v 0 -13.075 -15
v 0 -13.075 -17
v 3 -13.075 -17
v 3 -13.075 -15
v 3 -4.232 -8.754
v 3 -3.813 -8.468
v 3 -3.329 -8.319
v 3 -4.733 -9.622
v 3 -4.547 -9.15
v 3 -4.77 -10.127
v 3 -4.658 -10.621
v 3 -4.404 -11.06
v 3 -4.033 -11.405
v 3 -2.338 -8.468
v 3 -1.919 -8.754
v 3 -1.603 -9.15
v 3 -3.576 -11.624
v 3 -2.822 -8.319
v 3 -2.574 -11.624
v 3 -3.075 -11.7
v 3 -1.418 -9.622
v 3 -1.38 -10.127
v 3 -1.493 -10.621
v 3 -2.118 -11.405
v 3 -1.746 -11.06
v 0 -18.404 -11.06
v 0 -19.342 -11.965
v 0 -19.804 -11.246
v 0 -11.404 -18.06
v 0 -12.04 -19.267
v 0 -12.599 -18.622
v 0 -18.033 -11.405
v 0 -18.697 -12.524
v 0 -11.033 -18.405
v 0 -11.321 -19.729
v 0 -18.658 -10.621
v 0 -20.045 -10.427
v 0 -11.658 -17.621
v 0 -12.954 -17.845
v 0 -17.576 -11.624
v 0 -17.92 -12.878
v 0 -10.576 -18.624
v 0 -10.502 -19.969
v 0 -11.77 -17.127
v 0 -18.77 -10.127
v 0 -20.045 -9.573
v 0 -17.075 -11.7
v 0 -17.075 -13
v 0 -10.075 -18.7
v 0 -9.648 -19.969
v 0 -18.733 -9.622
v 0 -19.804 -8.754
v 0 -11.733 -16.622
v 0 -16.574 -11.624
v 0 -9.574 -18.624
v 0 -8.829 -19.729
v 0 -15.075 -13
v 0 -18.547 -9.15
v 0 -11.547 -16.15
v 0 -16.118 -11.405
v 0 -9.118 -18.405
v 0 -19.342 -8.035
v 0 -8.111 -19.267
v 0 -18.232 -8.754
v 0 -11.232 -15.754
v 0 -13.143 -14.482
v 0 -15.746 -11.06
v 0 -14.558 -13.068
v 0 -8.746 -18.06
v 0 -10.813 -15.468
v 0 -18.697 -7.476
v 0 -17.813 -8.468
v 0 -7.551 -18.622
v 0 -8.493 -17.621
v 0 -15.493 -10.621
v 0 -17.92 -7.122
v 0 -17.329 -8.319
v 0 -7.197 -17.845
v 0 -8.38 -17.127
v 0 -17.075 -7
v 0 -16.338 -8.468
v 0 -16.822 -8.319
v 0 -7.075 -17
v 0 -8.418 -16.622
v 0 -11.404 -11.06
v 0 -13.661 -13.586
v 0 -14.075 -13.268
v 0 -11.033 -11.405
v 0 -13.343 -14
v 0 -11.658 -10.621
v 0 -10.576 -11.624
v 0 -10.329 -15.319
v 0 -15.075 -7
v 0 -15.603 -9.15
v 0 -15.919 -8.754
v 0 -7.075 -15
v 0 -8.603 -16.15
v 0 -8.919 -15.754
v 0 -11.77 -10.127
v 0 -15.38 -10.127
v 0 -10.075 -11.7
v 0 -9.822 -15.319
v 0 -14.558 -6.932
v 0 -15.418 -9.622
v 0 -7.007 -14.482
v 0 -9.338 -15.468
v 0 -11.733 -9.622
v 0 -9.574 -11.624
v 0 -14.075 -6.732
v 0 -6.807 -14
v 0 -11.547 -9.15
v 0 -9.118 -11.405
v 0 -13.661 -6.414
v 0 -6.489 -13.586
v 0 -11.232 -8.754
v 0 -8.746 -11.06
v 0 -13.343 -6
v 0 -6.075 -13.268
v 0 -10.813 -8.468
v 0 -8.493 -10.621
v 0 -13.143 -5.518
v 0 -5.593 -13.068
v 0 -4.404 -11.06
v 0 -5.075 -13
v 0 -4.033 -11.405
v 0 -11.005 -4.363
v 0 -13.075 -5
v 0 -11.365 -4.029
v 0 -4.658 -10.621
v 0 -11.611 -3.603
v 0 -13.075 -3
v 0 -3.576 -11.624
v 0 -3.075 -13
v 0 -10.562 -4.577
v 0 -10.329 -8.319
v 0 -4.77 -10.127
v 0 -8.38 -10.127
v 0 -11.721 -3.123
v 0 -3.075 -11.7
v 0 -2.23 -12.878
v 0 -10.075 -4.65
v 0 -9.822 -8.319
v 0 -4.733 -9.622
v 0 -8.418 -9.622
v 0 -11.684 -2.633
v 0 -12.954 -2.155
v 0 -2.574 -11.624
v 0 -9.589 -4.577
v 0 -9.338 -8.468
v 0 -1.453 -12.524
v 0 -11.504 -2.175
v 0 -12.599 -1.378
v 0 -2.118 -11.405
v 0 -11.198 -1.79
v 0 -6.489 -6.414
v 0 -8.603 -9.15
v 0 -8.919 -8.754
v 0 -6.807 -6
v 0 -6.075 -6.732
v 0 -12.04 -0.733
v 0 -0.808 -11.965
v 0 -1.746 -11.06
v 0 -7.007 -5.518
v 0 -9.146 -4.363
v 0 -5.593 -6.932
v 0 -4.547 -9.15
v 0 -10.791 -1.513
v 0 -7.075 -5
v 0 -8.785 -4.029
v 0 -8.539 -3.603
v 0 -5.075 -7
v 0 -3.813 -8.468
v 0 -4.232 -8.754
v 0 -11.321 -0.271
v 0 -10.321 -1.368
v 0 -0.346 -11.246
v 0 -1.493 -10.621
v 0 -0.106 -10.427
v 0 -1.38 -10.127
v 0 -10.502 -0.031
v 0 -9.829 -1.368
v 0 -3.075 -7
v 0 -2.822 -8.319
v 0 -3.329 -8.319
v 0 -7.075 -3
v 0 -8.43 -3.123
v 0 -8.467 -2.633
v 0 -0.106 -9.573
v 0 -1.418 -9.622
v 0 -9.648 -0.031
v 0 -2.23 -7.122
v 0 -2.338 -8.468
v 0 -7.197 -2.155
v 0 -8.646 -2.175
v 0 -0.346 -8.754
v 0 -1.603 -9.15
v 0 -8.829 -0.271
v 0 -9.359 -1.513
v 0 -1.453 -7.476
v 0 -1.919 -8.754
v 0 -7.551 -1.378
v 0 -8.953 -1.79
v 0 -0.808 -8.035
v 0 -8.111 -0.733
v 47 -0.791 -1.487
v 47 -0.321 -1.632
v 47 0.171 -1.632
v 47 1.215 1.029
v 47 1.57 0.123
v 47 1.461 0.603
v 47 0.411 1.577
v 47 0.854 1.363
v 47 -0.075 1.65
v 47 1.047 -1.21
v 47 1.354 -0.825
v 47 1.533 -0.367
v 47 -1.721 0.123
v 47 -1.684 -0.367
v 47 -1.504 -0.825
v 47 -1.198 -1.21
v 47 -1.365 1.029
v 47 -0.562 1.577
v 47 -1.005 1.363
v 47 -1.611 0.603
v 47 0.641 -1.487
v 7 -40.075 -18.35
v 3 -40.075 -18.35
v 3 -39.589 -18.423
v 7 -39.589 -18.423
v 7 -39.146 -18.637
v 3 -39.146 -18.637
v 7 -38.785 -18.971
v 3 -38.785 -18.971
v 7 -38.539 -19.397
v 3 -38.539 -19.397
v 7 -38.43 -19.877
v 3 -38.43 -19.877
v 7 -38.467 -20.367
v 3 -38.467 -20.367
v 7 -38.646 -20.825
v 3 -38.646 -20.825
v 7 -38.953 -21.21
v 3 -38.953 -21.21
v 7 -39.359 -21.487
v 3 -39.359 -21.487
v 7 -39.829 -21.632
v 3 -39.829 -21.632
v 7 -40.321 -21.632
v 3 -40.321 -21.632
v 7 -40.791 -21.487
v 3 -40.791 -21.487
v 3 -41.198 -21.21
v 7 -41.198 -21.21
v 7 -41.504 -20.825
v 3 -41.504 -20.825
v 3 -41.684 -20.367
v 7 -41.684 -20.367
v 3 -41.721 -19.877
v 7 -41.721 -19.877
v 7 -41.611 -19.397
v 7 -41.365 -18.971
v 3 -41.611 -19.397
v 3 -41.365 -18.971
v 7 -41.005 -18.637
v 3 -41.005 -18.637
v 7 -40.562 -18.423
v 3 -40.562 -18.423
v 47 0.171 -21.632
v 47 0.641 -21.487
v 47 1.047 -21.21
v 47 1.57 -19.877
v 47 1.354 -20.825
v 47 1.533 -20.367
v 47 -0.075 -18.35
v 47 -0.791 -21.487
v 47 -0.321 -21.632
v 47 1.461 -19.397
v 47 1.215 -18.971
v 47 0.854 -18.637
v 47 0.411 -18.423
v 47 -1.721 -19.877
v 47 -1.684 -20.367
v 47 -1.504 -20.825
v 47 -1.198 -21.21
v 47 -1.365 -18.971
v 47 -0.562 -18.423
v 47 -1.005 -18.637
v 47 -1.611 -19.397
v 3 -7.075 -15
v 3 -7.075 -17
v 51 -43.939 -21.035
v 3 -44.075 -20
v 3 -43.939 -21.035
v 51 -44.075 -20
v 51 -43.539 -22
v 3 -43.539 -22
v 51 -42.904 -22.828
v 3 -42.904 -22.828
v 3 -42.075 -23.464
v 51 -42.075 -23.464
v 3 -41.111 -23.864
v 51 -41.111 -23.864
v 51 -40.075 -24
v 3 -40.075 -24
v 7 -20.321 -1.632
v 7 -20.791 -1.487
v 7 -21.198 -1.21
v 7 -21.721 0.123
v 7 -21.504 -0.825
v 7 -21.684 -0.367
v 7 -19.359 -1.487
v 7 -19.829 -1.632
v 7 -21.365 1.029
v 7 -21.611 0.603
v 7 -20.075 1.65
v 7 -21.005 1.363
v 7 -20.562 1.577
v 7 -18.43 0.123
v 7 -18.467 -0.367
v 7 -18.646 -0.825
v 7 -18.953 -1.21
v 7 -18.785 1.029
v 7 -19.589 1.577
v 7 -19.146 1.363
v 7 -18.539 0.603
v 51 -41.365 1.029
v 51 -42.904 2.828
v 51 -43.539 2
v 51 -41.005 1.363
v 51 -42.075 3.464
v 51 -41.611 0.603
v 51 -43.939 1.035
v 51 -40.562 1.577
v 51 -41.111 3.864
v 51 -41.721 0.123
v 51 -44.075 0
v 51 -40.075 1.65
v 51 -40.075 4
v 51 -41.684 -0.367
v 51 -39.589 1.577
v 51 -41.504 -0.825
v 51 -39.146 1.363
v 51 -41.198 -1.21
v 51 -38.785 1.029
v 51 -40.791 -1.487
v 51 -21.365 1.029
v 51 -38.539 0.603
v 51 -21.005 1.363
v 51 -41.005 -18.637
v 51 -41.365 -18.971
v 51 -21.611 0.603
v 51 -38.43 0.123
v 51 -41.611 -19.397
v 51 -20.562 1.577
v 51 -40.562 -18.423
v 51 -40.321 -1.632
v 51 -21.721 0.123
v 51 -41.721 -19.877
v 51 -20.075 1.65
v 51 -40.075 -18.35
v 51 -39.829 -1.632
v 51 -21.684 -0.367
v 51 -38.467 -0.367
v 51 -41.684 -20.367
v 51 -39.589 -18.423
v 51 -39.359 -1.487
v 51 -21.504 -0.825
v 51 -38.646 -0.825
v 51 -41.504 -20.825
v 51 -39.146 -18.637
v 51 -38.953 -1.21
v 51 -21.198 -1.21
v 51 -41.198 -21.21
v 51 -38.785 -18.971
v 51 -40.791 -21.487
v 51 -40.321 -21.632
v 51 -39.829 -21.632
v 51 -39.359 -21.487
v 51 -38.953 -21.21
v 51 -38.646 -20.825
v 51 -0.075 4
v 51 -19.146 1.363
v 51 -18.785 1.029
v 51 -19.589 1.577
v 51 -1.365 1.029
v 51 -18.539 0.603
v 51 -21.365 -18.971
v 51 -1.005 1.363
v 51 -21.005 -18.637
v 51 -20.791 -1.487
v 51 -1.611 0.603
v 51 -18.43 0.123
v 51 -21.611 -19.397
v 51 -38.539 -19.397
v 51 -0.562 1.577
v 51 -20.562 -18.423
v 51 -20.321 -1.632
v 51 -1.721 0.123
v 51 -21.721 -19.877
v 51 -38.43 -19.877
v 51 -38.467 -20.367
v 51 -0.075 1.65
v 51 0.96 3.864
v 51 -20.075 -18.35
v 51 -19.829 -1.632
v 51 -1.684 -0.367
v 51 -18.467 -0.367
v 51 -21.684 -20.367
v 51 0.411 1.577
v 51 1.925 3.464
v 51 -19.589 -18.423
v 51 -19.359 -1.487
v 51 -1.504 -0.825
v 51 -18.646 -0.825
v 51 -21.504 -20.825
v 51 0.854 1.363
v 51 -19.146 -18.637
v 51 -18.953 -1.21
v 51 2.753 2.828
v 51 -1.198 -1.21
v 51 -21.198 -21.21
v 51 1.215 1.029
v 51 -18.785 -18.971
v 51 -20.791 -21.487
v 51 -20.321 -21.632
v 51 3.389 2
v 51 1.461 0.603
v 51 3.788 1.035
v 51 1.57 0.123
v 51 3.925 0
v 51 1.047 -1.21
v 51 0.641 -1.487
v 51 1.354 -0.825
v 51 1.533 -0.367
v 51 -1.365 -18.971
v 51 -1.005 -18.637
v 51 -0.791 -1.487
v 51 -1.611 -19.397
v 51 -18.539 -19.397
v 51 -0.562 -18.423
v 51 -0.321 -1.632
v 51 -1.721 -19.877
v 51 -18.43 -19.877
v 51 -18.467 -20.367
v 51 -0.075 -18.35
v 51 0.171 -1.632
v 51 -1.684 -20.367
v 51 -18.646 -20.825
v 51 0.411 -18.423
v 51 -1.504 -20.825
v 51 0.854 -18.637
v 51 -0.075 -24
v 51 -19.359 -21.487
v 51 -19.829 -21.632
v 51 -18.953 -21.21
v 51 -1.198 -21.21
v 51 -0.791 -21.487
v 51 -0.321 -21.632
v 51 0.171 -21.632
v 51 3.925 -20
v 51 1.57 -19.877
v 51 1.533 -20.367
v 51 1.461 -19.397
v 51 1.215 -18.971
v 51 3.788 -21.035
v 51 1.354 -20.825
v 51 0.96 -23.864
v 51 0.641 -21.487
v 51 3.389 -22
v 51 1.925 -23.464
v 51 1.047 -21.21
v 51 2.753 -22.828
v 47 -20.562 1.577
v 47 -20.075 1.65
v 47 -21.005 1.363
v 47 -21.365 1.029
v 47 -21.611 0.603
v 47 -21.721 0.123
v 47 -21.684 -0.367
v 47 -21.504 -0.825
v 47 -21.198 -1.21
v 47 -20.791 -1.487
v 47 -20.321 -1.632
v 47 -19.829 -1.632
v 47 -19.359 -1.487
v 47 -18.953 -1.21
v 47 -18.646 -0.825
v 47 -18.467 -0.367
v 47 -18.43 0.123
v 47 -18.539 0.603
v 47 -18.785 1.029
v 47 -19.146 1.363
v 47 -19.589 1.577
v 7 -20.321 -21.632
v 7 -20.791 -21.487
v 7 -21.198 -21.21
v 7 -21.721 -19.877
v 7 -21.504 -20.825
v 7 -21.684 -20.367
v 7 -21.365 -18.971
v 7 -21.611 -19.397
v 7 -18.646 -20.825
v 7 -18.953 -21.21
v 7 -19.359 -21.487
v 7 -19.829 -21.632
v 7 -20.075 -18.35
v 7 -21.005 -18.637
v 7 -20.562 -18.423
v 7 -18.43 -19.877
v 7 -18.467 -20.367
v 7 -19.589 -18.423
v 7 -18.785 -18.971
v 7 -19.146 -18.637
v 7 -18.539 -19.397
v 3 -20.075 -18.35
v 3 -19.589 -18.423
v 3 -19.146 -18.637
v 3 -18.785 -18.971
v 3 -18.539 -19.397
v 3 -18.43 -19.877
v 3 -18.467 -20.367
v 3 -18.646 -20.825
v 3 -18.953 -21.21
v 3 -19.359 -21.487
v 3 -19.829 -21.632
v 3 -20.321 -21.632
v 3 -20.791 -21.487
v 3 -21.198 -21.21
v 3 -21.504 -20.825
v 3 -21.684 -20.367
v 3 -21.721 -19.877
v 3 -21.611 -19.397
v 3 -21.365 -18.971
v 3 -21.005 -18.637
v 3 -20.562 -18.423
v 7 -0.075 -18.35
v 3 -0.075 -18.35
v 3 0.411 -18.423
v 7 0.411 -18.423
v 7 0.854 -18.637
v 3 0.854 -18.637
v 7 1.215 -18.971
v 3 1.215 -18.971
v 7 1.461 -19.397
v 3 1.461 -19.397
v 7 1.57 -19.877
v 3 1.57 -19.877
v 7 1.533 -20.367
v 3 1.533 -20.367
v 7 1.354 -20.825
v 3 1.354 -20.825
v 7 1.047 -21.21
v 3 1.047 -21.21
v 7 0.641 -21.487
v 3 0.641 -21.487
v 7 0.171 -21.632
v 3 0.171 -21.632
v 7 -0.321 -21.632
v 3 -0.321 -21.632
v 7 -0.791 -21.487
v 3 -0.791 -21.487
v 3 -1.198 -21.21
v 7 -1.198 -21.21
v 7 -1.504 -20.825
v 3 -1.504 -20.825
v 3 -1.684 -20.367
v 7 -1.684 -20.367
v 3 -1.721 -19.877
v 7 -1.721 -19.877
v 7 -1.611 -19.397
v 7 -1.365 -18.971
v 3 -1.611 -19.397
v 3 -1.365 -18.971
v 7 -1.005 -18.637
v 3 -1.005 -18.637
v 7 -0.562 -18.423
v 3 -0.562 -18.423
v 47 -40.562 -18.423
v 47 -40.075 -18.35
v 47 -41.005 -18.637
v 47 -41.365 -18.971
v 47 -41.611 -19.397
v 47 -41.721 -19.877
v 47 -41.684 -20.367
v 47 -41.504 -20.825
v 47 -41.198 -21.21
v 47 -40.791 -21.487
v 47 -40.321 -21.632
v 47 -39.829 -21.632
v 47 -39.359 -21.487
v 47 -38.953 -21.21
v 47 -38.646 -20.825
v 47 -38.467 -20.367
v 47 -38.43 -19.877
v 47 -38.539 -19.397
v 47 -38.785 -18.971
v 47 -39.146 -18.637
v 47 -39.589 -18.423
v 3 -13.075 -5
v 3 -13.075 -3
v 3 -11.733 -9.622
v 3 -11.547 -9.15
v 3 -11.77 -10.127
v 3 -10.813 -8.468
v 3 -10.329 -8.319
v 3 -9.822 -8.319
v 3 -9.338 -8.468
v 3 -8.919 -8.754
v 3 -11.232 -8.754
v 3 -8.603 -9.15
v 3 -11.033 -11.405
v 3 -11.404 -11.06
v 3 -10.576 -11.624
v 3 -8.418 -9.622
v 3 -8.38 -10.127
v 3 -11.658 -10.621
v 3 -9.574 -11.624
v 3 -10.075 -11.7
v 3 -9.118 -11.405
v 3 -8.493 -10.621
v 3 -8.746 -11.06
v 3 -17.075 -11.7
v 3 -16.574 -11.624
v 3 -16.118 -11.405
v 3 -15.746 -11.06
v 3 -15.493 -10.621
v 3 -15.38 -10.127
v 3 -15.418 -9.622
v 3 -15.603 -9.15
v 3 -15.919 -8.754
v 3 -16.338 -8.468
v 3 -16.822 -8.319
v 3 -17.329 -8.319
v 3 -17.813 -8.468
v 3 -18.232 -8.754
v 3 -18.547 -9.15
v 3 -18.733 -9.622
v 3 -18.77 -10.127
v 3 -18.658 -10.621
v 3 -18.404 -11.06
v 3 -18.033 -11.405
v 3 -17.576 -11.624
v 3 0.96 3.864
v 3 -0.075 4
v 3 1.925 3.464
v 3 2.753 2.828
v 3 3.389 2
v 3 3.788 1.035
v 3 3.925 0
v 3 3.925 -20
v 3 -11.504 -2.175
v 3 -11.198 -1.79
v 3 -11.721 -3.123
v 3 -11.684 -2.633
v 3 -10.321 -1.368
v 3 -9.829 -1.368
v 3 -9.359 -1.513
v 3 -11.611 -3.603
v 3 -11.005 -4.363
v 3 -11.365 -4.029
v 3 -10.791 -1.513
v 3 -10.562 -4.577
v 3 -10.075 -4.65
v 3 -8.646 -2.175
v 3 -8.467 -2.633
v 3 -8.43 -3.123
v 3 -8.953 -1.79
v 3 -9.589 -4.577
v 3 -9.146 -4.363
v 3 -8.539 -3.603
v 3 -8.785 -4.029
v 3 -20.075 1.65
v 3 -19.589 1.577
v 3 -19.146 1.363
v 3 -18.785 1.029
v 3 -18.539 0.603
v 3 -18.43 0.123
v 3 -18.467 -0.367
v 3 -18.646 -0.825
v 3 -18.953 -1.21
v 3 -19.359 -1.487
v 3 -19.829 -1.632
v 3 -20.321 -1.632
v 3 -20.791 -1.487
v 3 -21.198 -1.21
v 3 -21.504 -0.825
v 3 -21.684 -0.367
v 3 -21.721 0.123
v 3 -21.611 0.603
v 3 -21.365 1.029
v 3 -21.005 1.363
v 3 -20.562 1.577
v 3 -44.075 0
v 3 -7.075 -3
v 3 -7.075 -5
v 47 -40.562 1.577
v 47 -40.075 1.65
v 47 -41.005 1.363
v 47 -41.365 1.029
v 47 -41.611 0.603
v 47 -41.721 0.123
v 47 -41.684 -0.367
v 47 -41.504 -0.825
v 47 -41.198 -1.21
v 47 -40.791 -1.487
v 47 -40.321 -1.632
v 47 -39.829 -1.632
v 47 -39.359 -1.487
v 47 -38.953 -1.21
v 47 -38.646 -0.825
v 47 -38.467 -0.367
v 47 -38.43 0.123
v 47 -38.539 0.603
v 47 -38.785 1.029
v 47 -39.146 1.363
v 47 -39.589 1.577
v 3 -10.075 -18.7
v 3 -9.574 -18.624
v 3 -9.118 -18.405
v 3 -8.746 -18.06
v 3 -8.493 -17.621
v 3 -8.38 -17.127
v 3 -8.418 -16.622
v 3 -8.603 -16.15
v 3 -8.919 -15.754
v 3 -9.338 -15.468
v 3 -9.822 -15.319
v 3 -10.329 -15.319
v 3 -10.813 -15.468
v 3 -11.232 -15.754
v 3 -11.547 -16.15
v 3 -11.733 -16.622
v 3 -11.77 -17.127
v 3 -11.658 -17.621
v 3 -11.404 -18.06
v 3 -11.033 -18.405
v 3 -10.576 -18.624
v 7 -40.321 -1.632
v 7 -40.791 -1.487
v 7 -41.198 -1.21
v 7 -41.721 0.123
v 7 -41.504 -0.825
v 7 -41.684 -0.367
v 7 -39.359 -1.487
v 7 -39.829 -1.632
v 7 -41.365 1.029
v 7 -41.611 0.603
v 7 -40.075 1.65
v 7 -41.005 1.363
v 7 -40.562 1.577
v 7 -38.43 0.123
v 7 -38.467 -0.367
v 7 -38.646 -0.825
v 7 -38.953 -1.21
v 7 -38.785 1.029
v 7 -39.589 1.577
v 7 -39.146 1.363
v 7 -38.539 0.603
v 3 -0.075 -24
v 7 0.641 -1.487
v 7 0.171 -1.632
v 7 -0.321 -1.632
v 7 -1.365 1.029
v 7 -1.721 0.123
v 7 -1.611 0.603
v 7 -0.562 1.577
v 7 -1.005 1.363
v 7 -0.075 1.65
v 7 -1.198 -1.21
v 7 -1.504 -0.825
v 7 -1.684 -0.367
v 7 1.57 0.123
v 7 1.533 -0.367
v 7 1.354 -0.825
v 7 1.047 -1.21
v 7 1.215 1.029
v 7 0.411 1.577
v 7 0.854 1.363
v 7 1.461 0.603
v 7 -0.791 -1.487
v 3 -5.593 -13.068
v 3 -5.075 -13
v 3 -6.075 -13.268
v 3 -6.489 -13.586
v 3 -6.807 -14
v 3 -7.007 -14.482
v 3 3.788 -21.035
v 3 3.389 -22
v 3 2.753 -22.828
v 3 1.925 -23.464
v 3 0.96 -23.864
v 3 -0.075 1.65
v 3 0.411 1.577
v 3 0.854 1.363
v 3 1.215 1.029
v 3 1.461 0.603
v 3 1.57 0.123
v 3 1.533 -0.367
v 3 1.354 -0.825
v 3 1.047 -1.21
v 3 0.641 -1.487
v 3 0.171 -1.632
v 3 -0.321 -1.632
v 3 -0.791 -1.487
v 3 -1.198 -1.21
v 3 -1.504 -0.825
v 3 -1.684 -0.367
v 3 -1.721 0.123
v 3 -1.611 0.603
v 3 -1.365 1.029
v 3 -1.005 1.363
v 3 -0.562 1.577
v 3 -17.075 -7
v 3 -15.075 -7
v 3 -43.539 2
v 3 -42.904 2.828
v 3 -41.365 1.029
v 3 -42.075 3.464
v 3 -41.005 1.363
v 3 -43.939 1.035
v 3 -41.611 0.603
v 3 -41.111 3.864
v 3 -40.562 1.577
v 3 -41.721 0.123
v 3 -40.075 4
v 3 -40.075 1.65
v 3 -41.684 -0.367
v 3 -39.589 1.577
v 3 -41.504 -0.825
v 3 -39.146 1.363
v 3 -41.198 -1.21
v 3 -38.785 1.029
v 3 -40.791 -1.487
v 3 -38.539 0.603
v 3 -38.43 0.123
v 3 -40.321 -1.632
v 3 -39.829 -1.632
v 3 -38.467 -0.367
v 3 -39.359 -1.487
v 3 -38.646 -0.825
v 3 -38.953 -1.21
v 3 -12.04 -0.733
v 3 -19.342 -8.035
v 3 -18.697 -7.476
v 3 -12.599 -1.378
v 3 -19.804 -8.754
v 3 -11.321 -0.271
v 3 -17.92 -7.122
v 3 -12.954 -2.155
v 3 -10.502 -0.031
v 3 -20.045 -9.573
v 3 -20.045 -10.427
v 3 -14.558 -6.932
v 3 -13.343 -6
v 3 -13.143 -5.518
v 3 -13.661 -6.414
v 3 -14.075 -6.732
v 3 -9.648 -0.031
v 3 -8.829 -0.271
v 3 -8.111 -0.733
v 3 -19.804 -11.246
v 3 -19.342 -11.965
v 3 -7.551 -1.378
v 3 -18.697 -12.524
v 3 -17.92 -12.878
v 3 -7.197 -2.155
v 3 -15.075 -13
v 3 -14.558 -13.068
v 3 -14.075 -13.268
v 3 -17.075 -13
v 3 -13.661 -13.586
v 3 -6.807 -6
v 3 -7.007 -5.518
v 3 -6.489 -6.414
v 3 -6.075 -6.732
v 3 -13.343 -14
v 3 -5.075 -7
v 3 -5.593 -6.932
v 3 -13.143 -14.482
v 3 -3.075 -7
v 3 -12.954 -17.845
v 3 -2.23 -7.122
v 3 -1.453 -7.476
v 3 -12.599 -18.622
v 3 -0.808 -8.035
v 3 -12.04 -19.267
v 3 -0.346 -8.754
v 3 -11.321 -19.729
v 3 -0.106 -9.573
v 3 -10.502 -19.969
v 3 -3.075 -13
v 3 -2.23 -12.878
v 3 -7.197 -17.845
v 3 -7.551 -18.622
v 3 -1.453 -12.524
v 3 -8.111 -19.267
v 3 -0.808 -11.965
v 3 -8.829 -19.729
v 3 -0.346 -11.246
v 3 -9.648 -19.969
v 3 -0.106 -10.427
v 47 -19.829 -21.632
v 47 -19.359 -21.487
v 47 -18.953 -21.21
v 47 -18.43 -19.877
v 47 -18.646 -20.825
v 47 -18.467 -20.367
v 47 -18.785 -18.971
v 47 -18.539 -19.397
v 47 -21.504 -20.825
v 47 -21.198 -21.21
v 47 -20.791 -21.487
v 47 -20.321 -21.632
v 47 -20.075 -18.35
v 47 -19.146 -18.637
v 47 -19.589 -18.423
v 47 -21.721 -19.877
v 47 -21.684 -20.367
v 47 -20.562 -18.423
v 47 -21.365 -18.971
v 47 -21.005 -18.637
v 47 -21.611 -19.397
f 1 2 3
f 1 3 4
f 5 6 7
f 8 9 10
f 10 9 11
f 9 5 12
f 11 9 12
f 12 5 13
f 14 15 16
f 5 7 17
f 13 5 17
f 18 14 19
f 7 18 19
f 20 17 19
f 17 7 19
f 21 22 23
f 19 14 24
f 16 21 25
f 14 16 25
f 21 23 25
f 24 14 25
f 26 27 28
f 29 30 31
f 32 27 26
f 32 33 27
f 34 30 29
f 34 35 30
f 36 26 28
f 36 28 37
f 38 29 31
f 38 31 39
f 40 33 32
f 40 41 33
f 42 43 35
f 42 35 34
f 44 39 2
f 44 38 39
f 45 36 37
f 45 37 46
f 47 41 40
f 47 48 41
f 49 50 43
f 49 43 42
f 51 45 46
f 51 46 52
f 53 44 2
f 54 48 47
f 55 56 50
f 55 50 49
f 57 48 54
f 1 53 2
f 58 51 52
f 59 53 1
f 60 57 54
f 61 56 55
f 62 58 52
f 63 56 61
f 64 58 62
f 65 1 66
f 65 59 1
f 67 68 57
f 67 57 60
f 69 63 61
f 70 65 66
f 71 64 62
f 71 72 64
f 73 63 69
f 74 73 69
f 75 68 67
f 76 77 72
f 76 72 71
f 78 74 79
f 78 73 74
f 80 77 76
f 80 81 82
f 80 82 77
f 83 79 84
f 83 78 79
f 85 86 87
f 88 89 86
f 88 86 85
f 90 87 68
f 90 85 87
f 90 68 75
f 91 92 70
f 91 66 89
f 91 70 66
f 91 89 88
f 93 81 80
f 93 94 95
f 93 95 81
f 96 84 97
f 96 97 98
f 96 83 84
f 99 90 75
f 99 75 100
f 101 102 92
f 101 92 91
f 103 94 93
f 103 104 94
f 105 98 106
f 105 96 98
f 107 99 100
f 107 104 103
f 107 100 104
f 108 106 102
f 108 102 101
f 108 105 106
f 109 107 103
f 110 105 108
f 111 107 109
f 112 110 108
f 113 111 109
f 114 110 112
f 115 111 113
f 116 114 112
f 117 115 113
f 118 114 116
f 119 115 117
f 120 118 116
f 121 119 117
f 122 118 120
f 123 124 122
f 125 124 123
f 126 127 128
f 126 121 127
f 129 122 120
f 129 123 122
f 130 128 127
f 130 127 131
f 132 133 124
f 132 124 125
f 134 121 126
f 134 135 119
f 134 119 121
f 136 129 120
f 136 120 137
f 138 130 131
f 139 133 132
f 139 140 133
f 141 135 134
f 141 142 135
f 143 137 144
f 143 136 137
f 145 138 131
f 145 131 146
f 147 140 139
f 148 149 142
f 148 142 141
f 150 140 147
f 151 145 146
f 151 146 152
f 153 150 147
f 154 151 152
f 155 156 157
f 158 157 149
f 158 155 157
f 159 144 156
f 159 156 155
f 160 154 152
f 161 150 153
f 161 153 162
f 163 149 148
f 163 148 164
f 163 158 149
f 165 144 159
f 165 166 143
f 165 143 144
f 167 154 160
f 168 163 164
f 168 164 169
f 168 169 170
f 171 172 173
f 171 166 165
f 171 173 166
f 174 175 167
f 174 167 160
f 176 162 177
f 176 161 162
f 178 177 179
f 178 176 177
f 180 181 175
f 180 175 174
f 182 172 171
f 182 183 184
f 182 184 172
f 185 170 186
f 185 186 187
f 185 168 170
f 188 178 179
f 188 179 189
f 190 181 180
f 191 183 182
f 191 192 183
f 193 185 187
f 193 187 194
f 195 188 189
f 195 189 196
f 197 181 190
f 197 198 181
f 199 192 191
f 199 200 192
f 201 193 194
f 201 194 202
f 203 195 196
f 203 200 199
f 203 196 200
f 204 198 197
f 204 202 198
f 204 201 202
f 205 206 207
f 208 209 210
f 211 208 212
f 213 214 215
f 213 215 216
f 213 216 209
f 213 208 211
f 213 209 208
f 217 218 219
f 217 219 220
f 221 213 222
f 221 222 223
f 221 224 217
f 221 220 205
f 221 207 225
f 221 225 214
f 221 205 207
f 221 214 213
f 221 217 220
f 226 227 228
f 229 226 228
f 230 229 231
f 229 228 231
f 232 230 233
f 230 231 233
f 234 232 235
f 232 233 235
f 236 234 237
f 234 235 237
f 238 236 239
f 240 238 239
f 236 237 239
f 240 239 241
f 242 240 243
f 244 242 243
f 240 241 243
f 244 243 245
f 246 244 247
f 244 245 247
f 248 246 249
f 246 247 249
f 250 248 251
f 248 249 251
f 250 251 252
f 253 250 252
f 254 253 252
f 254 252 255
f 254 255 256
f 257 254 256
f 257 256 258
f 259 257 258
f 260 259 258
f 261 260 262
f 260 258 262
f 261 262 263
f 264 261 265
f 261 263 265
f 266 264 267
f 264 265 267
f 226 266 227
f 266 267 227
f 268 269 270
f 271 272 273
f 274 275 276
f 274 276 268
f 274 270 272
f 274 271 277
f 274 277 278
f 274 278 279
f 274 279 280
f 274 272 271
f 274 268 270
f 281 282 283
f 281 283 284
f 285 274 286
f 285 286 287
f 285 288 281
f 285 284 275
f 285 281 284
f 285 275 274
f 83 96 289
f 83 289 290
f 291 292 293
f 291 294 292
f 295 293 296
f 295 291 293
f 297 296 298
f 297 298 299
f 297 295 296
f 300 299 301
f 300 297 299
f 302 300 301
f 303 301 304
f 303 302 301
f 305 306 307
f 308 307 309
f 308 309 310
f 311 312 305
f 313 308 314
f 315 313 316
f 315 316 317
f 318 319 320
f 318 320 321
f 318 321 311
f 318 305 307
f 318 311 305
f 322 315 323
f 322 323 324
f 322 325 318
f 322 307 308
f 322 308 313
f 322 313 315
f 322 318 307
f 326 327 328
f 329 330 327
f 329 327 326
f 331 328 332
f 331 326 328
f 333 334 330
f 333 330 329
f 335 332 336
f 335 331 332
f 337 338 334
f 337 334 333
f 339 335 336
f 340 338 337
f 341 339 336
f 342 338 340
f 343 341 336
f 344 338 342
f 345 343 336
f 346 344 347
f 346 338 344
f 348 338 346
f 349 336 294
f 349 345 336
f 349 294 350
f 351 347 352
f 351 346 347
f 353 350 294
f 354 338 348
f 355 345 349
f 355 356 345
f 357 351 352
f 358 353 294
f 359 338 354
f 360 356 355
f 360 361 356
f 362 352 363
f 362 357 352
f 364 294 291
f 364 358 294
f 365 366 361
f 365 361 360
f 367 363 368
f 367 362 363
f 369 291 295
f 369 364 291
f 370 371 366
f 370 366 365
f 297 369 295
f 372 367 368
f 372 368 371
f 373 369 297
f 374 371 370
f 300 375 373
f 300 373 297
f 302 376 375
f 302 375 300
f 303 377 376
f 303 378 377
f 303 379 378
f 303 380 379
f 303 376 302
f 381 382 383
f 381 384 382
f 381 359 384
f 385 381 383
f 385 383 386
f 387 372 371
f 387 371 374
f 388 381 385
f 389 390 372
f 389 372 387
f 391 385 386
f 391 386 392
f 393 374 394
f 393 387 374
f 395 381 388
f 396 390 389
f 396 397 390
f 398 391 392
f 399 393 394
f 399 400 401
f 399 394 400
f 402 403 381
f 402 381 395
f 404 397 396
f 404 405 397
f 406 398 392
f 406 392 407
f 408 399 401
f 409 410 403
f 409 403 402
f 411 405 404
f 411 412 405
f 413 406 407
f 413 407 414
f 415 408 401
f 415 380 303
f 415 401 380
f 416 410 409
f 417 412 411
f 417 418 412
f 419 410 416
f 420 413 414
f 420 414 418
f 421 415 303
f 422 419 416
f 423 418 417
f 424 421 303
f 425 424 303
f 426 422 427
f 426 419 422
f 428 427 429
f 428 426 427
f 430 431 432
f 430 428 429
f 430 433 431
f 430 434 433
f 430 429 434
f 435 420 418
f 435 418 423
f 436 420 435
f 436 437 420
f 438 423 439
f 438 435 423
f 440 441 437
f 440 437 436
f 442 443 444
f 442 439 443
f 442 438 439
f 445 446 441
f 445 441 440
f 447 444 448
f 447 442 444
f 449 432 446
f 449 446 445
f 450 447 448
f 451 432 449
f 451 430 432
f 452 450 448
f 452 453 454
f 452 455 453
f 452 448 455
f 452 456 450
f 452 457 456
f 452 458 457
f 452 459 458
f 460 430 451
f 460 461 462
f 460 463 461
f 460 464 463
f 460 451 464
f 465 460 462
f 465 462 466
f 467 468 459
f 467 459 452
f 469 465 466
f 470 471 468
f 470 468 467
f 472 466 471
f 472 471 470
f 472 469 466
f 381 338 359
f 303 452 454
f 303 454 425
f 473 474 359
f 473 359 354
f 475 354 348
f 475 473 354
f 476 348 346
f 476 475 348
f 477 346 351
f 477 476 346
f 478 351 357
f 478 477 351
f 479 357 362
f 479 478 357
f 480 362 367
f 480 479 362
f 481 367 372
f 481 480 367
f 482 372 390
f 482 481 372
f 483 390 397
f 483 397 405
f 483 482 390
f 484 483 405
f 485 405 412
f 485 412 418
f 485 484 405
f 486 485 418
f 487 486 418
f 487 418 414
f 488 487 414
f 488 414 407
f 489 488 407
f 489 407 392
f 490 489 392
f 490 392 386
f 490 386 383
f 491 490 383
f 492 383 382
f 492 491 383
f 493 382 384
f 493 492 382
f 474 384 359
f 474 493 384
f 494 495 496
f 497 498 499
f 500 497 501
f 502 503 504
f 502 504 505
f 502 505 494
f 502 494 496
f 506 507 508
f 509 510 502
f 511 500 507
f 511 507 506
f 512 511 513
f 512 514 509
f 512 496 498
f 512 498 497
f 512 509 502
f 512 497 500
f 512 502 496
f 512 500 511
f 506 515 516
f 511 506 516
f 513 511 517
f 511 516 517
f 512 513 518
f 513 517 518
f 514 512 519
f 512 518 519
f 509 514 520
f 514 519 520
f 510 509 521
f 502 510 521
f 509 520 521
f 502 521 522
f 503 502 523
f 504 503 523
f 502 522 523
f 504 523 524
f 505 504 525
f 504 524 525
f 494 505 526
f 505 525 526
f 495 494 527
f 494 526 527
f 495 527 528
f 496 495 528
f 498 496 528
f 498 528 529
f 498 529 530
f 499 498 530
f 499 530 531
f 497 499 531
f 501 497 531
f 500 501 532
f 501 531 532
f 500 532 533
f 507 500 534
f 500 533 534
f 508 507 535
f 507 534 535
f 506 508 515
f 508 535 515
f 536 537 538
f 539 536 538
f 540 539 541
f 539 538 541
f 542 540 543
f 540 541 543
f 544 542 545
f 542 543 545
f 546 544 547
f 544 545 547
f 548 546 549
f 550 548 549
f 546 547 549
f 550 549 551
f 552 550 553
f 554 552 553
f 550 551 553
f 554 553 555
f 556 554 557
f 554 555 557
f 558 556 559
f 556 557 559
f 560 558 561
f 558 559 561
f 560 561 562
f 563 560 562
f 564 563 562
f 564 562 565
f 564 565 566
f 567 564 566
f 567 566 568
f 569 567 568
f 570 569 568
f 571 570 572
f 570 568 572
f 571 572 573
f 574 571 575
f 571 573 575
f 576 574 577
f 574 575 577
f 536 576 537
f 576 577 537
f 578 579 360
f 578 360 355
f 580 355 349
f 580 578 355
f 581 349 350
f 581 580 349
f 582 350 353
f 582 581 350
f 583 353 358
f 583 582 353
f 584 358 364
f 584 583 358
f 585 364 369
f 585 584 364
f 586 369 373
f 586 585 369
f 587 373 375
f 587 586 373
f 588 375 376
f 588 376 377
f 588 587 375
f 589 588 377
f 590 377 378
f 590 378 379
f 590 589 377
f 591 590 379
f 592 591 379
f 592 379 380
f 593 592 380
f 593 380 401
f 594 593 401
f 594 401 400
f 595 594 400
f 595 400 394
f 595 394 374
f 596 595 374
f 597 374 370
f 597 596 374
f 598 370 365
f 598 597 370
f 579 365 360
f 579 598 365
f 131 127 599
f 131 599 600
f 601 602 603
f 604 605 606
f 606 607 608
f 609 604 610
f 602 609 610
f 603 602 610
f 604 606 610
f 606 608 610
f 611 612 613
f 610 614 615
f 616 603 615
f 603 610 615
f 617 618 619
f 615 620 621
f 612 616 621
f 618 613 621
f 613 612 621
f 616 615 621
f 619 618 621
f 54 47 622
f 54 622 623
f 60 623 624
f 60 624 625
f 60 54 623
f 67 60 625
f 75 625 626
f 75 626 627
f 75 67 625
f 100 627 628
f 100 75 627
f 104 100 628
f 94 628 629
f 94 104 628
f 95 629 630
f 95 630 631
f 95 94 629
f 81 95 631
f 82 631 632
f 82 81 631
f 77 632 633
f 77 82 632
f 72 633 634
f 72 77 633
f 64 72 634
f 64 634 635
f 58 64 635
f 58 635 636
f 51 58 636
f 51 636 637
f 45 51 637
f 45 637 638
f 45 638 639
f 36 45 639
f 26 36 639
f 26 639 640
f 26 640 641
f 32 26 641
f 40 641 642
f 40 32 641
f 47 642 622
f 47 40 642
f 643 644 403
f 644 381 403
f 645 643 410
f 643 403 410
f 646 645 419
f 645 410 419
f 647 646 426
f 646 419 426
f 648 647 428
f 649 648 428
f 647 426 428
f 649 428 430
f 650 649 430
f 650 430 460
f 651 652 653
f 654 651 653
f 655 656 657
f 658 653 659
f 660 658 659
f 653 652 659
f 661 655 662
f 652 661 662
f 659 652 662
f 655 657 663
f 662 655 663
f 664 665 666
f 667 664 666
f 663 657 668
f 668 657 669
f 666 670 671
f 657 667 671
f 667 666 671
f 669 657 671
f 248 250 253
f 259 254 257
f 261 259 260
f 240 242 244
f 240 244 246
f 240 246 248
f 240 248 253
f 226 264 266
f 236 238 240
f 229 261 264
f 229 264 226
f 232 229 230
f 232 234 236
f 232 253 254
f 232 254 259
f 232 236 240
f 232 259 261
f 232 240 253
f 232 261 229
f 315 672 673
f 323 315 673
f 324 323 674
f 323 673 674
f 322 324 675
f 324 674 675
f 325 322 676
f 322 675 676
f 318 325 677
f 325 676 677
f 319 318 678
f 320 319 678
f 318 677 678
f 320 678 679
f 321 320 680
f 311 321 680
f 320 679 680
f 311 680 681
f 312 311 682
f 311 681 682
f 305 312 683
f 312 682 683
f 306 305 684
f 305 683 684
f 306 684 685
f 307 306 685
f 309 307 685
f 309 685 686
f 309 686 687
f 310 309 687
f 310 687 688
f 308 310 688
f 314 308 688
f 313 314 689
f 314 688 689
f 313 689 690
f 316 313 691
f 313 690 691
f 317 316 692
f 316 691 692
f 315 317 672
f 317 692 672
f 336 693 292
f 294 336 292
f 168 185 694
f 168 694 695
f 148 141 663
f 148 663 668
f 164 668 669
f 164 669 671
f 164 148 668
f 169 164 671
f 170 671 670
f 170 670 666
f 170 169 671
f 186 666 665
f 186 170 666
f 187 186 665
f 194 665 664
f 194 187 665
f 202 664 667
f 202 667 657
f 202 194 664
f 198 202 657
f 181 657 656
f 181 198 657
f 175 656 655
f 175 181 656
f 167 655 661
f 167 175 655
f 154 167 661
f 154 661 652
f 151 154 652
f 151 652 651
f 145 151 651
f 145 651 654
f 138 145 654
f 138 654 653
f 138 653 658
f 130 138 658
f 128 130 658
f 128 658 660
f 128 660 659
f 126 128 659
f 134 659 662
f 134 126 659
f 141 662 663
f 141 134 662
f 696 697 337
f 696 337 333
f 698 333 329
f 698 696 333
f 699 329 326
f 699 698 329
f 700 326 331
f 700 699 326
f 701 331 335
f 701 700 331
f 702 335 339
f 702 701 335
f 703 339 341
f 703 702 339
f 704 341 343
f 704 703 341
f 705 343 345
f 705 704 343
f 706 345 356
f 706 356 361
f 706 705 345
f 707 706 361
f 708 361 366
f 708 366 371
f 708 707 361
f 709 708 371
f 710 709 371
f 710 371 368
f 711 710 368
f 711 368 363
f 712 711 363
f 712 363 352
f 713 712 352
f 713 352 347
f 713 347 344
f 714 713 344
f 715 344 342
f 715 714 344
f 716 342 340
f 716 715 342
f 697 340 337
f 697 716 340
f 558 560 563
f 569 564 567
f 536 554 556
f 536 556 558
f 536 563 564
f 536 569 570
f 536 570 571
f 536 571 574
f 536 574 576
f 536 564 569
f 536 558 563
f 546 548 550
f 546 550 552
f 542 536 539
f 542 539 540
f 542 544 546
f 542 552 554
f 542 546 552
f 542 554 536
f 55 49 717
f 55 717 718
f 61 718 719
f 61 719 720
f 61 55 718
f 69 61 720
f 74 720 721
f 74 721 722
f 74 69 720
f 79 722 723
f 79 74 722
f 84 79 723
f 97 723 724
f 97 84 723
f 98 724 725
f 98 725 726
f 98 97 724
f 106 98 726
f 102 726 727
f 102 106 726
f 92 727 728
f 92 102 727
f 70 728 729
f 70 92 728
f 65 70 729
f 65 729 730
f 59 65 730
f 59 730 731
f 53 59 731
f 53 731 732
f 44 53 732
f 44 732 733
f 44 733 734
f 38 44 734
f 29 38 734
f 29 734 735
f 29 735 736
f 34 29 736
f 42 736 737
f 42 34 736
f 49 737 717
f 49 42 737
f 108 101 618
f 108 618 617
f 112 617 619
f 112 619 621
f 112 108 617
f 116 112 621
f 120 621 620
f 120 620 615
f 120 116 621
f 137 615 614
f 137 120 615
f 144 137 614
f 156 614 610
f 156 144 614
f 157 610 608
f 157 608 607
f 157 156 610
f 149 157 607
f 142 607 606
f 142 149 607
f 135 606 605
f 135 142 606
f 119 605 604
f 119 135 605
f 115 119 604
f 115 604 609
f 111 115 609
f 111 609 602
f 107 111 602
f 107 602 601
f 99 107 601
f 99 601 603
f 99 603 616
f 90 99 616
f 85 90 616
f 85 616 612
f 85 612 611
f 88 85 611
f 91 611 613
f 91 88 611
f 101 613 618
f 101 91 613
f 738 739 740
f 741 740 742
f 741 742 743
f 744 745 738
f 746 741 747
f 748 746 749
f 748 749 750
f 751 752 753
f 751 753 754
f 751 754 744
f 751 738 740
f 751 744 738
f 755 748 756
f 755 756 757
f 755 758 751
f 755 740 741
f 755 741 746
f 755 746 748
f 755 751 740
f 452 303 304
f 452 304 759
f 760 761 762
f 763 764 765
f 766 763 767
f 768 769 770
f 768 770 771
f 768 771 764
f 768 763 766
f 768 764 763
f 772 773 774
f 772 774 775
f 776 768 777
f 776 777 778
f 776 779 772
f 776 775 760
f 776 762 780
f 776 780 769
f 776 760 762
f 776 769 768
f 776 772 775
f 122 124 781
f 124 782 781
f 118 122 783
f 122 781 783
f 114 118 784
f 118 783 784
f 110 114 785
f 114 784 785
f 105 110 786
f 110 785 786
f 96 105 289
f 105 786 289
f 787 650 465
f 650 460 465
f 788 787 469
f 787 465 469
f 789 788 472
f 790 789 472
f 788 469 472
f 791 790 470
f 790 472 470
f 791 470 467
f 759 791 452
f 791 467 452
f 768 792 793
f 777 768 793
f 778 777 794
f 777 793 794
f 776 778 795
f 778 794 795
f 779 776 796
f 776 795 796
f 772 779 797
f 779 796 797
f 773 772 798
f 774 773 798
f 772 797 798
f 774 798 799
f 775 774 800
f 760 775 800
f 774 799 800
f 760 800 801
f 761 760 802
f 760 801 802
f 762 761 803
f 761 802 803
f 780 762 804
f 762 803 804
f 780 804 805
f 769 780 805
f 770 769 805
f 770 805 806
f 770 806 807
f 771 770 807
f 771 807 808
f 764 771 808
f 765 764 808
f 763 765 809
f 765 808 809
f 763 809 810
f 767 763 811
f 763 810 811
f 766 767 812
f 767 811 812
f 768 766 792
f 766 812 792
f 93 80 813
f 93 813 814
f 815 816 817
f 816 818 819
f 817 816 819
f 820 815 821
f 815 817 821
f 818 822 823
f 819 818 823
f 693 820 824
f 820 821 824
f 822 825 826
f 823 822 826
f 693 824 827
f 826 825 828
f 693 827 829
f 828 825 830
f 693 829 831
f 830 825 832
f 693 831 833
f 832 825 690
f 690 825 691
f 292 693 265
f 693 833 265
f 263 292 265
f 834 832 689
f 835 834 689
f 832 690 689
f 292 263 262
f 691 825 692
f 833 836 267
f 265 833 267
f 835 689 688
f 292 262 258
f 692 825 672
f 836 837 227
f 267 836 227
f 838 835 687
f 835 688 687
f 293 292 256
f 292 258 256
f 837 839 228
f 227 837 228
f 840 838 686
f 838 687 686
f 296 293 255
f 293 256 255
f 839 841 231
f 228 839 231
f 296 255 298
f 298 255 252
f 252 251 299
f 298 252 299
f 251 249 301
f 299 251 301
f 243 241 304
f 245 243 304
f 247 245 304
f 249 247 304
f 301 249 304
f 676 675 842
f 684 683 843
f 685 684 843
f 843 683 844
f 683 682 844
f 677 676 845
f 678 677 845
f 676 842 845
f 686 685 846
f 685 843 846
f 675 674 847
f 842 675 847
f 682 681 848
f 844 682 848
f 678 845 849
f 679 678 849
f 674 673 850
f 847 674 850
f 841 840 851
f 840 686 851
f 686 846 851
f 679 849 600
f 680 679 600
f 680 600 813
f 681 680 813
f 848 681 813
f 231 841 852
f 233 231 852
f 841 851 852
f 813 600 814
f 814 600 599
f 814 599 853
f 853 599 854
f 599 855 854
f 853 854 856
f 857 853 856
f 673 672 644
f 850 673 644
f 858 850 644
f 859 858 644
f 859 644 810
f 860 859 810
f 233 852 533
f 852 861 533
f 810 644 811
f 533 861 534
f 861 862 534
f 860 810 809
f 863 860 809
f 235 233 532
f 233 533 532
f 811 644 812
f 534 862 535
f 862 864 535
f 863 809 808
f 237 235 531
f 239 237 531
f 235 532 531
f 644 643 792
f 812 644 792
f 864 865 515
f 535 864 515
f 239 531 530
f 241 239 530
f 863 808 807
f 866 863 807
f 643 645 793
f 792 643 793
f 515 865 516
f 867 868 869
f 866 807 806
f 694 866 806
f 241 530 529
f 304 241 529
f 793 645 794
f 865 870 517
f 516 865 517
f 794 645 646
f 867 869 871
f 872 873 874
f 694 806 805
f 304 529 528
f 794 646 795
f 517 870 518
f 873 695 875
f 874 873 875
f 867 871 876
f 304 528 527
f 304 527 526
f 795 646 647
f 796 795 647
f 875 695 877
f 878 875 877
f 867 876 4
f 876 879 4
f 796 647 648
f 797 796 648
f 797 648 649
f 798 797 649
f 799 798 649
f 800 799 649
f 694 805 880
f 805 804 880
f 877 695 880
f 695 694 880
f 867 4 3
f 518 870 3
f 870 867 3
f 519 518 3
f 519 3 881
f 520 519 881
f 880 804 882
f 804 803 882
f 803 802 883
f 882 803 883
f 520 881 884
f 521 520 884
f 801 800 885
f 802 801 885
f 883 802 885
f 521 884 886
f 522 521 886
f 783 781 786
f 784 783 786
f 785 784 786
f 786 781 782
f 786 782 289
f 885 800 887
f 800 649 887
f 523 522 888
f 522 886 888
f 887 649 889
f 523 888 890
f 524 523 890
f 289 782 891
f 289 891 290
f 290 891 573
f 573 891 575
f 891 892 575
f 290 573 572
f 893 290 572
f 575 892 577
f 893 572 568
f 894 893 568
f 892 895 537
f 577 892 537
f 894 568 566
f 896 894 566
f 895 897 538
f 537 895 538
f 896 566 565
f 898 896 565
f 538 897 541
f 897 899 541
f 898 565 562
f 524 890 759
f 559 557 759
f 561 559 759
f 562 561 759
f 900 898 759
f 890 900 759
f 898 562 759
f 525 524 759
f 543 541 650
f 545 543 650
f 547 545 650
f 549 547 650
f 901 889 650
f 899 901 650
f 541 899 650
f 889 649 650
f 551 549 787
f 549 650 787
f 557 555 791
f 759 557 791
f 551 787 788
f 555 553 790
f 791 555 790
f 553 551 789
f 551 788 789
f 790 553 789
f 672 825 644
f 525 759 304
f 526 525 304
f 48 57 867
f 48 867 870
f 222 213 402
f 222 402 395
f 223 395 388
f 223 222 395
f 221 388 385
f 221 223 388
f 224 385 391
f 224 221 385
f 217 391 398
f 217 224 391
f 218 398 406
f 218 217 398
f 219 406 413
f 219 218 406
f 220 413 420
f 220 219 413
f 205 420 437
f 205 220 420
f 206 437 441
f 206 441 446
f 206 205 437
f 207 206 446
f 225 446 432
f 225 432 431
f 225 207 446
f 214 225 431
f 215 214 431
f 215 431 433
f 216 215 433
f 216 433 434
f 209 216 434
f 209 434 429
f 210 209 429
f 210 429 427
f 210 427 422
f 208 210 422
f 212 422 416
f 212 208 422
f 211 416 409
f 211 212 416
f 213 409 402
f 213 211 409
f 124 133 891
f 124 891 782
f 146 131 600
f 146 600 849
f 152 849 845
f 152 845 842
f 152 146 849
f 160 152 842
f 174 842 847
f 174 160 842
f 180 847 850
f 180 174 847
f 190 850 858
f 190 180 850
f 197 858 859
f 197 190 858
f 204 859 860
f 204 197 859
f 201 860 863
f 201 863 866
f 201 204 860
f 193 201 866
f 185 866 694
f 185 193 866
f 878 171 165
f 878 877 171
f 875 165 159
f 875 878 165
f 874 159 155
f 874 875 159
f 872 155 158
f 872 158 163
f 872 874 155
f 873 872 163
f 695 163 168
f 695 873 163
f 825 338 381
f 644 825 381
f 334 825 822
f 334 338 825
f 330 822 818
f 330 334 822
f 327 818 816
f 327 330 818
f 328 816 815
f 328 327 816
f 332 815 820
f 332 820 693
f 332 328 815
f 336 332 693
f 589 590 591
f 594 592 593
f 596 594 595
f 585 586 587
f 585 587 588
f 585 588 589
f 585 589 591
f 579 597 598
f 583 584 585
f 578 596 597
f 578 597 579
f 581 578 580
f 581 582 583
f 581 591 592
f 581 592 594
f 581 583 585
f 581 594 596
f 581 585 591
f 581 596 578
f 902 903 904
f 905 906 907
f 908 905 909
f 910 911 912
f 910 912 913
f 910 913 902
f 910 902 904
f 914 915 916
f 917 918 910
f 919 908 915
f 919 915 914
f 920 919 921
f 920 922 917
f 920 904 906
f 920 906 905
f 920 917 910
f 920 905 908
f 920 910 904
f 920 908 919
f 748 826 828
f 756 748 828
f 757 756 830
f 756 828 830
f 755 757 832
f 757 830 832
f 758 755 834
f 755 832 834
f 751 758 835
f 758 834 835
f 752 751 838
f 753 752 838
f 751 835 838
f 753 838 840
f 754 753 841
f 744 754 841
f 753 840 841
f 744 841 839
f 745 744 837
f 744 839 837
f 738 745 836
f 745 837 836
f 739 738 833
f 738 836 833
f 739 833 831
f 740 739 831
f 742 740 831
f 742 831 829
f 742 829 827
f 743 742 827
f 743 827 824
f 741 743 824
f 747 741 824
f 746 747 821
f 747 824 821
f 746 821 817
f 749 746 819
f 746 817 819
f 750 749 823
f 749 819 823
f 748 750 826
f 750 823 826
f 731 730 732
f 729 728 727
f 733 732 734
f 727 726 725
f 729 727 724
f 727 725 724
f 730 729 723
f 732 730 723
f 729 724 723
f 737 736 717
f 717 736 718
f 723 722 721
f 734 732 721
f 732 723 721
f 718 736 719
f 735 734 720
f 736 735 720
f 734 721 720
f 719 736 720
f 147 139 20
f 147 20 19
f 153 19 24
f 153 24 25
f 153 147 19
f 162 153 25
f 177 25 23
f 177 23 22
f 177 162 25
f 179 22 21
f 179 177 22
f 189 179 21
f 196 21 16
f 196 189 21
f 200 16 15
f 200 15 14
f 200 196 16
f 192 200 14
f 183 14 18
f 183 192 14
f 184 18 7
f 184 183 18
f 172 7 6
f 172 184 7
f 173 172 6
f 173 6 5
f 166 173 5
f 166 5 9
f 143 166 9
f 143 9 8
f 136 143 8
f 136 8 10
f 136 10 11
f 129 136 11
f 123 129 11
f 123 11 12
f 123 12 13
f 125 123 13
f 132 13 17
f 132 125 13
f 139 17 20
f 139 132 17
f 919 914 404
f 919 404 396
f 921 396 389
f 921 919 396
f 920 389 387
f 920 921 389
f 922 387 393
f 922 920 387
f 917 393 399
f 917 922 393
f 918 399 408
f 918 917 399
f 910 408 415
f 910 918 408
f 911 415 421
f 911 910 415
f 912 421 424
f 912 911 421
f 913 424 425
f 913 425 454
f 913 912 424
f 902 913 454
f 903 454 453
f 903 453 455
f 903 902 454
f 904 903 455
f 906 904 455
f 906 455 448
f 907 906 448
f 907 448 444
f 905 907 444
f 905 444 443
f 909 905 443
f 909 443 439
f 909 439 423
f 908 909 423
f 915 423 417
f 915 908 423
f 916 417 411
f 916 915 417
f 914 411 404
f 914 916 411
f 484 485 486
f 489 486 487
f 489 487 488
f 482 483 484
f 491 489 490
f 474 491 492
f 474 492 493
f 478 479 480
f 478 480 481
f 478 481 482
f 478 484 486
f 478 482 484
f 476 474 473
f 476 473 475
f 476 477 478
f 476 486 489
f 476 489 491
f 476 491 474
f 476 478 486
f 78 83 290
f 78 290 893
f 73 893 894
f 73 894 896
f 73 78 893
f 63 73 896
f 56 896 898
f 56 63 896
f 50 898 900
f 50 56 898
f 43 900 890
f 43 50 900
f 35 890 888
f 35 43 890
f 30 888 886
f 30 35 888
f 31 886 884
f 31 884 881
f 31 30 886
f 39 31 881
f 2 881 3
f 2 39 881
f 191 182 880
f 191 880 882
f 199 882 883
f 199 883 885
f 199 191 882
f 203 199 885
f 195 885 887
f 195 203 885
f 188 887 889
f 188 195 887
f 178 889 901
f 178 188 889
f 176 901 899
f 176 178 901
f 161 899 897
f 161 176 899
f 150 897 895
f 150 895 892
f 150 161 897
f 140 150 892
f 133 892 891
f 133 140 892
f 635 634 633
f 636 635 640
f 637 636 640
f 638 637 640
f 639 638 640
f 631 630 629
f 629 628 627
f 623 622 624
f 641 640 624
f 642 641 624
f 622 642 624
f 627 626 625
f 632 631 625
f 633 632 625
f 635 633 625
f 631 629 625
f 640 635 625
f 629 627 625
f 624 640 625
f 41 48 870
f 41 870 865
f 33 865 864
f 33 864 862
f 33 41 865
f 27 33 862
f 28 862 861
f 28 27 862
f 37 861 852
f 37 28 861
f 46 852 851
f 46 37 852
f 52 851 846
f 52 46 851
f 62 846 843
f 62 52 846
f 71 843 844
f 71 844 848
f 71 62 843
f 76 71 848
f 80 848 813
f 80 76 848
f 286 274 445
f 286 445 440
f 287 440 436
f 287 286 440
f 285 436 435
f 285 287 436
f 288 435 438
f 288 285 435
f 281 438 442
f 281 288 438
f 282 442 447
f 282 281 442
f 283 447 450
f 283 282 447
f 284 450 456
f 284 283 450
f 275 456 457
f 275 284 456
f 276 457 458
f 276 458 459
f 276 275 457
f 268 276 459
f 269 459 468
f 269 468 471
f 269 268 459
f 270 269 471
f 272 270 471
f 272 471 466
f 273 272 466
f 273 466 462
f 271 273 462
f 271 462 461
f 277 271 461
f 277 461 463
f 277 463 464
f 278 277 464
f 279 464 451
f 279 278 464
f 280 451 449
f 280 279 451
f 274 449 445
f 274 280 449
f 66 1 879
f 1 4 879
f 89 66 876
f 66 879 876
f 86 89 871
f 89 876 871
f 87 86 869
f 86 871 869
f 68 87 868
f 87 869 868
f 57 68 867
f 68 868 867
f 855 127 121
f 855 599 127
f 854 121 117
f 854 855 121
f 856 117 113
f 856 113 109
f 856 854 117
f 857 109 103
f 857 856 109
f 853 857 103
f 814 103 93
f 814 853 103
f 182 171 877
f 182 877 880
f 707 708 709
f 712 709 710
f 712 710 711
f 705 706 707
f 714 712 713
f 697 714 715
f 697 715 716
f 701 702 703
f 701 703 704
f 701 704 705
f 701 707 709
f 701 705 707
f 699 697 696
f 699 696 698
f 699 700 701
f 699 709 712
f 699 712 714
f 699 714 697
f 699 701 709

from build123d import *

# Parameters (mm, degrees)
SKETCH_1_R          = 1.7
SKETCH_1_R_2        = 1.65
EXTRUDE_1_DEPTH     = 3
SKETCH_2_W          = 28
SKETCH_2_H          = 48
EXTRUDE_2_DEPTH     = 48
FILLET_1_R          = 4
SKETCH_3_R          = 1.65
CUT_EXTRUDE_1_DEPTH = 4
CUT_EXTRUDE_START   = -4
SKETCH_4_R          = 1.65
CUT_EXTRUDE_2_DEPTH = 4
FILLET_2_R          = 2


with BuildPart() as part:
    # 草图1 → 凸台-拉伸1 (new body)
    with BuildSketch(Plane(origin=(0, 0, 0), x_dir=(0, 0, -1), z_dir=(1, 0, 0))):
        with BuildLine():
            Line((13, -3.07523153), (13, -7.07523153))
            Line((13, -7.07523153), (17, -7.07523153))
            ThreePointArc((17, -7.07523153), (20, -10.07523153), (17, -13.07523153))
            Line((17, -13.07523153), (13, -13.07523153))
            Line((13, -13.07523153), (13, -17.07523153))
            ThreePointArc((13, -17.07523153), (10, -20.07523153), (7, -17.07523153))
            Line((7, -17.07523153), (7, -13.07523153))
            Line((7, -13.07523153), (3, -13.07523153))
            ThreePointArc((3, -13.07523153), (0, -10.07523153), (3, -7.07523153))
            Line((3, -7.07523153), (7, -7.07523153))
            Line((7, -7.07523153), (7, -3.07523153))
            ThreePointArc((7, -3.07523153), (10, -0.07523153), (13, -3.07523153))
        make_face()
        with Locations((10, -3.07523153)):
            Circle(SKETCH_1_R, mode=Mode.SUBTRACT)
        with Locations((3, -10.07523153)):
            Circle(SKETCH_1_R_2, mode=Mode.SUBTRACT)
        with Locations((10, -17.07523153)):
            Circle(SKETCH_1_R, mode=Mode.SUBTRACT)
        with Locations((17, -10.07523153)):
            Circle(SKETCH_1_R, mode=Mode.SUBTRACT)
        with Locations((10, -10.07523153)):
            Circle(SKETCH_1_R, mode=Mode.SUBTRACT)
    extrude(amount=EXTRUDE_1_DEPTH)

    # 草图2 → 凸台-拉伸2 (add)
    with BuildSketch(Plane(origin=(3, 0, 0), x_dir=(0, 0, -1), z_dir=(1, 0, 0))):
        with Locations((10, -20.07523153)):
            Rectangle(SKETCH_2_W, SKETCH_2_H)
    extrude(amount=EXTRUDE_2_DEPTH)

    # 圆角1
    fillet_1_edges = [part.edges().sort_by_distance(p)[0] for p in [
        (27, 3.92476847, -24),
        (27, 3.92476847, 4),
        (27, -44.07523153, 4),
        (27, -44.07523153, -24),
    ]]
    fillet(fillet_1_edges, radius=FILLET_1_R)

    # 草图3 → 切除-拉伸1 (cut)
    with BuildSketch(Plane.ZY.offset(-3)):
        with Locations((-20, -0.07523153)):
            Circle(SKETCH_3_R)
        with Locations((0, -0.07523153)):
            Circle(SKETCH_3_R)
        with Locations((0, -20.07523153)):
            Circle(SKETCH_3_R)
        with Locations((-20, -20.07523153)):
            Circle(SKETCH_3_R)
        with Locations((-20, -40.07523153)):
            Circle(SKETCH_3_R)
        with Locations((0, -40.07523153)):
            Circle(SKETCH_3_R)
    extrude(amount=-CUT_EXTRUDE_1_DEPTH, mode=Mode.SUBTRACT)

    # 草图4 → 切除-拉伸2 (cut)
    with BuildSketch(Plane(origin=(51, 0, 0), x_dir=(0, 0, -1), z_dir=(1, 0, 0)).offset(CUT_EXTRUDE_START)):
        with Locations(Location((0, -0.07523153, 0), (0, 0, 180))):
            Circle(SKETCH_4_R)
        with Locations(Location((20, -0.07523153, 0), (0, 0, 180))):
            Circle(SKETCH_4_R)
        with Locations(Location((0, -20.07523153, 0), (0, 0, 180))):
            Circle(SKETCH_4_R)
        with Locations(Location((20, -20.07523153, 0), (0, 0, 180))):
            Circle(SKETCH_4_R)
        with Locations(Location((0, -40.07523153, 0), (0, 0, 180))):
            Circle(SKETCH_4_R)
        with Locations(Location((20, -40.07523153, 0), (0, 0, 180))):
            Circle(SKETCH_4_R)
    extrude(amount=CUT_EXTRUDE_2_DEPTH, mode=Mode.SUBTRACT)

    # 圆角2
    fillet_2_edges = [part.edges().sort_by_distance(p)[0] for p in [
        (1.5, -13.07523153, -13),
        (1.5, -13.07523153, -7),
        (1.5, -7.07523153, -7),
        (1.5, -7.07523153, -13),
    ]]
    fillet(fillet_2_edges, radius=FILLET_2_R)


solid = part.part
